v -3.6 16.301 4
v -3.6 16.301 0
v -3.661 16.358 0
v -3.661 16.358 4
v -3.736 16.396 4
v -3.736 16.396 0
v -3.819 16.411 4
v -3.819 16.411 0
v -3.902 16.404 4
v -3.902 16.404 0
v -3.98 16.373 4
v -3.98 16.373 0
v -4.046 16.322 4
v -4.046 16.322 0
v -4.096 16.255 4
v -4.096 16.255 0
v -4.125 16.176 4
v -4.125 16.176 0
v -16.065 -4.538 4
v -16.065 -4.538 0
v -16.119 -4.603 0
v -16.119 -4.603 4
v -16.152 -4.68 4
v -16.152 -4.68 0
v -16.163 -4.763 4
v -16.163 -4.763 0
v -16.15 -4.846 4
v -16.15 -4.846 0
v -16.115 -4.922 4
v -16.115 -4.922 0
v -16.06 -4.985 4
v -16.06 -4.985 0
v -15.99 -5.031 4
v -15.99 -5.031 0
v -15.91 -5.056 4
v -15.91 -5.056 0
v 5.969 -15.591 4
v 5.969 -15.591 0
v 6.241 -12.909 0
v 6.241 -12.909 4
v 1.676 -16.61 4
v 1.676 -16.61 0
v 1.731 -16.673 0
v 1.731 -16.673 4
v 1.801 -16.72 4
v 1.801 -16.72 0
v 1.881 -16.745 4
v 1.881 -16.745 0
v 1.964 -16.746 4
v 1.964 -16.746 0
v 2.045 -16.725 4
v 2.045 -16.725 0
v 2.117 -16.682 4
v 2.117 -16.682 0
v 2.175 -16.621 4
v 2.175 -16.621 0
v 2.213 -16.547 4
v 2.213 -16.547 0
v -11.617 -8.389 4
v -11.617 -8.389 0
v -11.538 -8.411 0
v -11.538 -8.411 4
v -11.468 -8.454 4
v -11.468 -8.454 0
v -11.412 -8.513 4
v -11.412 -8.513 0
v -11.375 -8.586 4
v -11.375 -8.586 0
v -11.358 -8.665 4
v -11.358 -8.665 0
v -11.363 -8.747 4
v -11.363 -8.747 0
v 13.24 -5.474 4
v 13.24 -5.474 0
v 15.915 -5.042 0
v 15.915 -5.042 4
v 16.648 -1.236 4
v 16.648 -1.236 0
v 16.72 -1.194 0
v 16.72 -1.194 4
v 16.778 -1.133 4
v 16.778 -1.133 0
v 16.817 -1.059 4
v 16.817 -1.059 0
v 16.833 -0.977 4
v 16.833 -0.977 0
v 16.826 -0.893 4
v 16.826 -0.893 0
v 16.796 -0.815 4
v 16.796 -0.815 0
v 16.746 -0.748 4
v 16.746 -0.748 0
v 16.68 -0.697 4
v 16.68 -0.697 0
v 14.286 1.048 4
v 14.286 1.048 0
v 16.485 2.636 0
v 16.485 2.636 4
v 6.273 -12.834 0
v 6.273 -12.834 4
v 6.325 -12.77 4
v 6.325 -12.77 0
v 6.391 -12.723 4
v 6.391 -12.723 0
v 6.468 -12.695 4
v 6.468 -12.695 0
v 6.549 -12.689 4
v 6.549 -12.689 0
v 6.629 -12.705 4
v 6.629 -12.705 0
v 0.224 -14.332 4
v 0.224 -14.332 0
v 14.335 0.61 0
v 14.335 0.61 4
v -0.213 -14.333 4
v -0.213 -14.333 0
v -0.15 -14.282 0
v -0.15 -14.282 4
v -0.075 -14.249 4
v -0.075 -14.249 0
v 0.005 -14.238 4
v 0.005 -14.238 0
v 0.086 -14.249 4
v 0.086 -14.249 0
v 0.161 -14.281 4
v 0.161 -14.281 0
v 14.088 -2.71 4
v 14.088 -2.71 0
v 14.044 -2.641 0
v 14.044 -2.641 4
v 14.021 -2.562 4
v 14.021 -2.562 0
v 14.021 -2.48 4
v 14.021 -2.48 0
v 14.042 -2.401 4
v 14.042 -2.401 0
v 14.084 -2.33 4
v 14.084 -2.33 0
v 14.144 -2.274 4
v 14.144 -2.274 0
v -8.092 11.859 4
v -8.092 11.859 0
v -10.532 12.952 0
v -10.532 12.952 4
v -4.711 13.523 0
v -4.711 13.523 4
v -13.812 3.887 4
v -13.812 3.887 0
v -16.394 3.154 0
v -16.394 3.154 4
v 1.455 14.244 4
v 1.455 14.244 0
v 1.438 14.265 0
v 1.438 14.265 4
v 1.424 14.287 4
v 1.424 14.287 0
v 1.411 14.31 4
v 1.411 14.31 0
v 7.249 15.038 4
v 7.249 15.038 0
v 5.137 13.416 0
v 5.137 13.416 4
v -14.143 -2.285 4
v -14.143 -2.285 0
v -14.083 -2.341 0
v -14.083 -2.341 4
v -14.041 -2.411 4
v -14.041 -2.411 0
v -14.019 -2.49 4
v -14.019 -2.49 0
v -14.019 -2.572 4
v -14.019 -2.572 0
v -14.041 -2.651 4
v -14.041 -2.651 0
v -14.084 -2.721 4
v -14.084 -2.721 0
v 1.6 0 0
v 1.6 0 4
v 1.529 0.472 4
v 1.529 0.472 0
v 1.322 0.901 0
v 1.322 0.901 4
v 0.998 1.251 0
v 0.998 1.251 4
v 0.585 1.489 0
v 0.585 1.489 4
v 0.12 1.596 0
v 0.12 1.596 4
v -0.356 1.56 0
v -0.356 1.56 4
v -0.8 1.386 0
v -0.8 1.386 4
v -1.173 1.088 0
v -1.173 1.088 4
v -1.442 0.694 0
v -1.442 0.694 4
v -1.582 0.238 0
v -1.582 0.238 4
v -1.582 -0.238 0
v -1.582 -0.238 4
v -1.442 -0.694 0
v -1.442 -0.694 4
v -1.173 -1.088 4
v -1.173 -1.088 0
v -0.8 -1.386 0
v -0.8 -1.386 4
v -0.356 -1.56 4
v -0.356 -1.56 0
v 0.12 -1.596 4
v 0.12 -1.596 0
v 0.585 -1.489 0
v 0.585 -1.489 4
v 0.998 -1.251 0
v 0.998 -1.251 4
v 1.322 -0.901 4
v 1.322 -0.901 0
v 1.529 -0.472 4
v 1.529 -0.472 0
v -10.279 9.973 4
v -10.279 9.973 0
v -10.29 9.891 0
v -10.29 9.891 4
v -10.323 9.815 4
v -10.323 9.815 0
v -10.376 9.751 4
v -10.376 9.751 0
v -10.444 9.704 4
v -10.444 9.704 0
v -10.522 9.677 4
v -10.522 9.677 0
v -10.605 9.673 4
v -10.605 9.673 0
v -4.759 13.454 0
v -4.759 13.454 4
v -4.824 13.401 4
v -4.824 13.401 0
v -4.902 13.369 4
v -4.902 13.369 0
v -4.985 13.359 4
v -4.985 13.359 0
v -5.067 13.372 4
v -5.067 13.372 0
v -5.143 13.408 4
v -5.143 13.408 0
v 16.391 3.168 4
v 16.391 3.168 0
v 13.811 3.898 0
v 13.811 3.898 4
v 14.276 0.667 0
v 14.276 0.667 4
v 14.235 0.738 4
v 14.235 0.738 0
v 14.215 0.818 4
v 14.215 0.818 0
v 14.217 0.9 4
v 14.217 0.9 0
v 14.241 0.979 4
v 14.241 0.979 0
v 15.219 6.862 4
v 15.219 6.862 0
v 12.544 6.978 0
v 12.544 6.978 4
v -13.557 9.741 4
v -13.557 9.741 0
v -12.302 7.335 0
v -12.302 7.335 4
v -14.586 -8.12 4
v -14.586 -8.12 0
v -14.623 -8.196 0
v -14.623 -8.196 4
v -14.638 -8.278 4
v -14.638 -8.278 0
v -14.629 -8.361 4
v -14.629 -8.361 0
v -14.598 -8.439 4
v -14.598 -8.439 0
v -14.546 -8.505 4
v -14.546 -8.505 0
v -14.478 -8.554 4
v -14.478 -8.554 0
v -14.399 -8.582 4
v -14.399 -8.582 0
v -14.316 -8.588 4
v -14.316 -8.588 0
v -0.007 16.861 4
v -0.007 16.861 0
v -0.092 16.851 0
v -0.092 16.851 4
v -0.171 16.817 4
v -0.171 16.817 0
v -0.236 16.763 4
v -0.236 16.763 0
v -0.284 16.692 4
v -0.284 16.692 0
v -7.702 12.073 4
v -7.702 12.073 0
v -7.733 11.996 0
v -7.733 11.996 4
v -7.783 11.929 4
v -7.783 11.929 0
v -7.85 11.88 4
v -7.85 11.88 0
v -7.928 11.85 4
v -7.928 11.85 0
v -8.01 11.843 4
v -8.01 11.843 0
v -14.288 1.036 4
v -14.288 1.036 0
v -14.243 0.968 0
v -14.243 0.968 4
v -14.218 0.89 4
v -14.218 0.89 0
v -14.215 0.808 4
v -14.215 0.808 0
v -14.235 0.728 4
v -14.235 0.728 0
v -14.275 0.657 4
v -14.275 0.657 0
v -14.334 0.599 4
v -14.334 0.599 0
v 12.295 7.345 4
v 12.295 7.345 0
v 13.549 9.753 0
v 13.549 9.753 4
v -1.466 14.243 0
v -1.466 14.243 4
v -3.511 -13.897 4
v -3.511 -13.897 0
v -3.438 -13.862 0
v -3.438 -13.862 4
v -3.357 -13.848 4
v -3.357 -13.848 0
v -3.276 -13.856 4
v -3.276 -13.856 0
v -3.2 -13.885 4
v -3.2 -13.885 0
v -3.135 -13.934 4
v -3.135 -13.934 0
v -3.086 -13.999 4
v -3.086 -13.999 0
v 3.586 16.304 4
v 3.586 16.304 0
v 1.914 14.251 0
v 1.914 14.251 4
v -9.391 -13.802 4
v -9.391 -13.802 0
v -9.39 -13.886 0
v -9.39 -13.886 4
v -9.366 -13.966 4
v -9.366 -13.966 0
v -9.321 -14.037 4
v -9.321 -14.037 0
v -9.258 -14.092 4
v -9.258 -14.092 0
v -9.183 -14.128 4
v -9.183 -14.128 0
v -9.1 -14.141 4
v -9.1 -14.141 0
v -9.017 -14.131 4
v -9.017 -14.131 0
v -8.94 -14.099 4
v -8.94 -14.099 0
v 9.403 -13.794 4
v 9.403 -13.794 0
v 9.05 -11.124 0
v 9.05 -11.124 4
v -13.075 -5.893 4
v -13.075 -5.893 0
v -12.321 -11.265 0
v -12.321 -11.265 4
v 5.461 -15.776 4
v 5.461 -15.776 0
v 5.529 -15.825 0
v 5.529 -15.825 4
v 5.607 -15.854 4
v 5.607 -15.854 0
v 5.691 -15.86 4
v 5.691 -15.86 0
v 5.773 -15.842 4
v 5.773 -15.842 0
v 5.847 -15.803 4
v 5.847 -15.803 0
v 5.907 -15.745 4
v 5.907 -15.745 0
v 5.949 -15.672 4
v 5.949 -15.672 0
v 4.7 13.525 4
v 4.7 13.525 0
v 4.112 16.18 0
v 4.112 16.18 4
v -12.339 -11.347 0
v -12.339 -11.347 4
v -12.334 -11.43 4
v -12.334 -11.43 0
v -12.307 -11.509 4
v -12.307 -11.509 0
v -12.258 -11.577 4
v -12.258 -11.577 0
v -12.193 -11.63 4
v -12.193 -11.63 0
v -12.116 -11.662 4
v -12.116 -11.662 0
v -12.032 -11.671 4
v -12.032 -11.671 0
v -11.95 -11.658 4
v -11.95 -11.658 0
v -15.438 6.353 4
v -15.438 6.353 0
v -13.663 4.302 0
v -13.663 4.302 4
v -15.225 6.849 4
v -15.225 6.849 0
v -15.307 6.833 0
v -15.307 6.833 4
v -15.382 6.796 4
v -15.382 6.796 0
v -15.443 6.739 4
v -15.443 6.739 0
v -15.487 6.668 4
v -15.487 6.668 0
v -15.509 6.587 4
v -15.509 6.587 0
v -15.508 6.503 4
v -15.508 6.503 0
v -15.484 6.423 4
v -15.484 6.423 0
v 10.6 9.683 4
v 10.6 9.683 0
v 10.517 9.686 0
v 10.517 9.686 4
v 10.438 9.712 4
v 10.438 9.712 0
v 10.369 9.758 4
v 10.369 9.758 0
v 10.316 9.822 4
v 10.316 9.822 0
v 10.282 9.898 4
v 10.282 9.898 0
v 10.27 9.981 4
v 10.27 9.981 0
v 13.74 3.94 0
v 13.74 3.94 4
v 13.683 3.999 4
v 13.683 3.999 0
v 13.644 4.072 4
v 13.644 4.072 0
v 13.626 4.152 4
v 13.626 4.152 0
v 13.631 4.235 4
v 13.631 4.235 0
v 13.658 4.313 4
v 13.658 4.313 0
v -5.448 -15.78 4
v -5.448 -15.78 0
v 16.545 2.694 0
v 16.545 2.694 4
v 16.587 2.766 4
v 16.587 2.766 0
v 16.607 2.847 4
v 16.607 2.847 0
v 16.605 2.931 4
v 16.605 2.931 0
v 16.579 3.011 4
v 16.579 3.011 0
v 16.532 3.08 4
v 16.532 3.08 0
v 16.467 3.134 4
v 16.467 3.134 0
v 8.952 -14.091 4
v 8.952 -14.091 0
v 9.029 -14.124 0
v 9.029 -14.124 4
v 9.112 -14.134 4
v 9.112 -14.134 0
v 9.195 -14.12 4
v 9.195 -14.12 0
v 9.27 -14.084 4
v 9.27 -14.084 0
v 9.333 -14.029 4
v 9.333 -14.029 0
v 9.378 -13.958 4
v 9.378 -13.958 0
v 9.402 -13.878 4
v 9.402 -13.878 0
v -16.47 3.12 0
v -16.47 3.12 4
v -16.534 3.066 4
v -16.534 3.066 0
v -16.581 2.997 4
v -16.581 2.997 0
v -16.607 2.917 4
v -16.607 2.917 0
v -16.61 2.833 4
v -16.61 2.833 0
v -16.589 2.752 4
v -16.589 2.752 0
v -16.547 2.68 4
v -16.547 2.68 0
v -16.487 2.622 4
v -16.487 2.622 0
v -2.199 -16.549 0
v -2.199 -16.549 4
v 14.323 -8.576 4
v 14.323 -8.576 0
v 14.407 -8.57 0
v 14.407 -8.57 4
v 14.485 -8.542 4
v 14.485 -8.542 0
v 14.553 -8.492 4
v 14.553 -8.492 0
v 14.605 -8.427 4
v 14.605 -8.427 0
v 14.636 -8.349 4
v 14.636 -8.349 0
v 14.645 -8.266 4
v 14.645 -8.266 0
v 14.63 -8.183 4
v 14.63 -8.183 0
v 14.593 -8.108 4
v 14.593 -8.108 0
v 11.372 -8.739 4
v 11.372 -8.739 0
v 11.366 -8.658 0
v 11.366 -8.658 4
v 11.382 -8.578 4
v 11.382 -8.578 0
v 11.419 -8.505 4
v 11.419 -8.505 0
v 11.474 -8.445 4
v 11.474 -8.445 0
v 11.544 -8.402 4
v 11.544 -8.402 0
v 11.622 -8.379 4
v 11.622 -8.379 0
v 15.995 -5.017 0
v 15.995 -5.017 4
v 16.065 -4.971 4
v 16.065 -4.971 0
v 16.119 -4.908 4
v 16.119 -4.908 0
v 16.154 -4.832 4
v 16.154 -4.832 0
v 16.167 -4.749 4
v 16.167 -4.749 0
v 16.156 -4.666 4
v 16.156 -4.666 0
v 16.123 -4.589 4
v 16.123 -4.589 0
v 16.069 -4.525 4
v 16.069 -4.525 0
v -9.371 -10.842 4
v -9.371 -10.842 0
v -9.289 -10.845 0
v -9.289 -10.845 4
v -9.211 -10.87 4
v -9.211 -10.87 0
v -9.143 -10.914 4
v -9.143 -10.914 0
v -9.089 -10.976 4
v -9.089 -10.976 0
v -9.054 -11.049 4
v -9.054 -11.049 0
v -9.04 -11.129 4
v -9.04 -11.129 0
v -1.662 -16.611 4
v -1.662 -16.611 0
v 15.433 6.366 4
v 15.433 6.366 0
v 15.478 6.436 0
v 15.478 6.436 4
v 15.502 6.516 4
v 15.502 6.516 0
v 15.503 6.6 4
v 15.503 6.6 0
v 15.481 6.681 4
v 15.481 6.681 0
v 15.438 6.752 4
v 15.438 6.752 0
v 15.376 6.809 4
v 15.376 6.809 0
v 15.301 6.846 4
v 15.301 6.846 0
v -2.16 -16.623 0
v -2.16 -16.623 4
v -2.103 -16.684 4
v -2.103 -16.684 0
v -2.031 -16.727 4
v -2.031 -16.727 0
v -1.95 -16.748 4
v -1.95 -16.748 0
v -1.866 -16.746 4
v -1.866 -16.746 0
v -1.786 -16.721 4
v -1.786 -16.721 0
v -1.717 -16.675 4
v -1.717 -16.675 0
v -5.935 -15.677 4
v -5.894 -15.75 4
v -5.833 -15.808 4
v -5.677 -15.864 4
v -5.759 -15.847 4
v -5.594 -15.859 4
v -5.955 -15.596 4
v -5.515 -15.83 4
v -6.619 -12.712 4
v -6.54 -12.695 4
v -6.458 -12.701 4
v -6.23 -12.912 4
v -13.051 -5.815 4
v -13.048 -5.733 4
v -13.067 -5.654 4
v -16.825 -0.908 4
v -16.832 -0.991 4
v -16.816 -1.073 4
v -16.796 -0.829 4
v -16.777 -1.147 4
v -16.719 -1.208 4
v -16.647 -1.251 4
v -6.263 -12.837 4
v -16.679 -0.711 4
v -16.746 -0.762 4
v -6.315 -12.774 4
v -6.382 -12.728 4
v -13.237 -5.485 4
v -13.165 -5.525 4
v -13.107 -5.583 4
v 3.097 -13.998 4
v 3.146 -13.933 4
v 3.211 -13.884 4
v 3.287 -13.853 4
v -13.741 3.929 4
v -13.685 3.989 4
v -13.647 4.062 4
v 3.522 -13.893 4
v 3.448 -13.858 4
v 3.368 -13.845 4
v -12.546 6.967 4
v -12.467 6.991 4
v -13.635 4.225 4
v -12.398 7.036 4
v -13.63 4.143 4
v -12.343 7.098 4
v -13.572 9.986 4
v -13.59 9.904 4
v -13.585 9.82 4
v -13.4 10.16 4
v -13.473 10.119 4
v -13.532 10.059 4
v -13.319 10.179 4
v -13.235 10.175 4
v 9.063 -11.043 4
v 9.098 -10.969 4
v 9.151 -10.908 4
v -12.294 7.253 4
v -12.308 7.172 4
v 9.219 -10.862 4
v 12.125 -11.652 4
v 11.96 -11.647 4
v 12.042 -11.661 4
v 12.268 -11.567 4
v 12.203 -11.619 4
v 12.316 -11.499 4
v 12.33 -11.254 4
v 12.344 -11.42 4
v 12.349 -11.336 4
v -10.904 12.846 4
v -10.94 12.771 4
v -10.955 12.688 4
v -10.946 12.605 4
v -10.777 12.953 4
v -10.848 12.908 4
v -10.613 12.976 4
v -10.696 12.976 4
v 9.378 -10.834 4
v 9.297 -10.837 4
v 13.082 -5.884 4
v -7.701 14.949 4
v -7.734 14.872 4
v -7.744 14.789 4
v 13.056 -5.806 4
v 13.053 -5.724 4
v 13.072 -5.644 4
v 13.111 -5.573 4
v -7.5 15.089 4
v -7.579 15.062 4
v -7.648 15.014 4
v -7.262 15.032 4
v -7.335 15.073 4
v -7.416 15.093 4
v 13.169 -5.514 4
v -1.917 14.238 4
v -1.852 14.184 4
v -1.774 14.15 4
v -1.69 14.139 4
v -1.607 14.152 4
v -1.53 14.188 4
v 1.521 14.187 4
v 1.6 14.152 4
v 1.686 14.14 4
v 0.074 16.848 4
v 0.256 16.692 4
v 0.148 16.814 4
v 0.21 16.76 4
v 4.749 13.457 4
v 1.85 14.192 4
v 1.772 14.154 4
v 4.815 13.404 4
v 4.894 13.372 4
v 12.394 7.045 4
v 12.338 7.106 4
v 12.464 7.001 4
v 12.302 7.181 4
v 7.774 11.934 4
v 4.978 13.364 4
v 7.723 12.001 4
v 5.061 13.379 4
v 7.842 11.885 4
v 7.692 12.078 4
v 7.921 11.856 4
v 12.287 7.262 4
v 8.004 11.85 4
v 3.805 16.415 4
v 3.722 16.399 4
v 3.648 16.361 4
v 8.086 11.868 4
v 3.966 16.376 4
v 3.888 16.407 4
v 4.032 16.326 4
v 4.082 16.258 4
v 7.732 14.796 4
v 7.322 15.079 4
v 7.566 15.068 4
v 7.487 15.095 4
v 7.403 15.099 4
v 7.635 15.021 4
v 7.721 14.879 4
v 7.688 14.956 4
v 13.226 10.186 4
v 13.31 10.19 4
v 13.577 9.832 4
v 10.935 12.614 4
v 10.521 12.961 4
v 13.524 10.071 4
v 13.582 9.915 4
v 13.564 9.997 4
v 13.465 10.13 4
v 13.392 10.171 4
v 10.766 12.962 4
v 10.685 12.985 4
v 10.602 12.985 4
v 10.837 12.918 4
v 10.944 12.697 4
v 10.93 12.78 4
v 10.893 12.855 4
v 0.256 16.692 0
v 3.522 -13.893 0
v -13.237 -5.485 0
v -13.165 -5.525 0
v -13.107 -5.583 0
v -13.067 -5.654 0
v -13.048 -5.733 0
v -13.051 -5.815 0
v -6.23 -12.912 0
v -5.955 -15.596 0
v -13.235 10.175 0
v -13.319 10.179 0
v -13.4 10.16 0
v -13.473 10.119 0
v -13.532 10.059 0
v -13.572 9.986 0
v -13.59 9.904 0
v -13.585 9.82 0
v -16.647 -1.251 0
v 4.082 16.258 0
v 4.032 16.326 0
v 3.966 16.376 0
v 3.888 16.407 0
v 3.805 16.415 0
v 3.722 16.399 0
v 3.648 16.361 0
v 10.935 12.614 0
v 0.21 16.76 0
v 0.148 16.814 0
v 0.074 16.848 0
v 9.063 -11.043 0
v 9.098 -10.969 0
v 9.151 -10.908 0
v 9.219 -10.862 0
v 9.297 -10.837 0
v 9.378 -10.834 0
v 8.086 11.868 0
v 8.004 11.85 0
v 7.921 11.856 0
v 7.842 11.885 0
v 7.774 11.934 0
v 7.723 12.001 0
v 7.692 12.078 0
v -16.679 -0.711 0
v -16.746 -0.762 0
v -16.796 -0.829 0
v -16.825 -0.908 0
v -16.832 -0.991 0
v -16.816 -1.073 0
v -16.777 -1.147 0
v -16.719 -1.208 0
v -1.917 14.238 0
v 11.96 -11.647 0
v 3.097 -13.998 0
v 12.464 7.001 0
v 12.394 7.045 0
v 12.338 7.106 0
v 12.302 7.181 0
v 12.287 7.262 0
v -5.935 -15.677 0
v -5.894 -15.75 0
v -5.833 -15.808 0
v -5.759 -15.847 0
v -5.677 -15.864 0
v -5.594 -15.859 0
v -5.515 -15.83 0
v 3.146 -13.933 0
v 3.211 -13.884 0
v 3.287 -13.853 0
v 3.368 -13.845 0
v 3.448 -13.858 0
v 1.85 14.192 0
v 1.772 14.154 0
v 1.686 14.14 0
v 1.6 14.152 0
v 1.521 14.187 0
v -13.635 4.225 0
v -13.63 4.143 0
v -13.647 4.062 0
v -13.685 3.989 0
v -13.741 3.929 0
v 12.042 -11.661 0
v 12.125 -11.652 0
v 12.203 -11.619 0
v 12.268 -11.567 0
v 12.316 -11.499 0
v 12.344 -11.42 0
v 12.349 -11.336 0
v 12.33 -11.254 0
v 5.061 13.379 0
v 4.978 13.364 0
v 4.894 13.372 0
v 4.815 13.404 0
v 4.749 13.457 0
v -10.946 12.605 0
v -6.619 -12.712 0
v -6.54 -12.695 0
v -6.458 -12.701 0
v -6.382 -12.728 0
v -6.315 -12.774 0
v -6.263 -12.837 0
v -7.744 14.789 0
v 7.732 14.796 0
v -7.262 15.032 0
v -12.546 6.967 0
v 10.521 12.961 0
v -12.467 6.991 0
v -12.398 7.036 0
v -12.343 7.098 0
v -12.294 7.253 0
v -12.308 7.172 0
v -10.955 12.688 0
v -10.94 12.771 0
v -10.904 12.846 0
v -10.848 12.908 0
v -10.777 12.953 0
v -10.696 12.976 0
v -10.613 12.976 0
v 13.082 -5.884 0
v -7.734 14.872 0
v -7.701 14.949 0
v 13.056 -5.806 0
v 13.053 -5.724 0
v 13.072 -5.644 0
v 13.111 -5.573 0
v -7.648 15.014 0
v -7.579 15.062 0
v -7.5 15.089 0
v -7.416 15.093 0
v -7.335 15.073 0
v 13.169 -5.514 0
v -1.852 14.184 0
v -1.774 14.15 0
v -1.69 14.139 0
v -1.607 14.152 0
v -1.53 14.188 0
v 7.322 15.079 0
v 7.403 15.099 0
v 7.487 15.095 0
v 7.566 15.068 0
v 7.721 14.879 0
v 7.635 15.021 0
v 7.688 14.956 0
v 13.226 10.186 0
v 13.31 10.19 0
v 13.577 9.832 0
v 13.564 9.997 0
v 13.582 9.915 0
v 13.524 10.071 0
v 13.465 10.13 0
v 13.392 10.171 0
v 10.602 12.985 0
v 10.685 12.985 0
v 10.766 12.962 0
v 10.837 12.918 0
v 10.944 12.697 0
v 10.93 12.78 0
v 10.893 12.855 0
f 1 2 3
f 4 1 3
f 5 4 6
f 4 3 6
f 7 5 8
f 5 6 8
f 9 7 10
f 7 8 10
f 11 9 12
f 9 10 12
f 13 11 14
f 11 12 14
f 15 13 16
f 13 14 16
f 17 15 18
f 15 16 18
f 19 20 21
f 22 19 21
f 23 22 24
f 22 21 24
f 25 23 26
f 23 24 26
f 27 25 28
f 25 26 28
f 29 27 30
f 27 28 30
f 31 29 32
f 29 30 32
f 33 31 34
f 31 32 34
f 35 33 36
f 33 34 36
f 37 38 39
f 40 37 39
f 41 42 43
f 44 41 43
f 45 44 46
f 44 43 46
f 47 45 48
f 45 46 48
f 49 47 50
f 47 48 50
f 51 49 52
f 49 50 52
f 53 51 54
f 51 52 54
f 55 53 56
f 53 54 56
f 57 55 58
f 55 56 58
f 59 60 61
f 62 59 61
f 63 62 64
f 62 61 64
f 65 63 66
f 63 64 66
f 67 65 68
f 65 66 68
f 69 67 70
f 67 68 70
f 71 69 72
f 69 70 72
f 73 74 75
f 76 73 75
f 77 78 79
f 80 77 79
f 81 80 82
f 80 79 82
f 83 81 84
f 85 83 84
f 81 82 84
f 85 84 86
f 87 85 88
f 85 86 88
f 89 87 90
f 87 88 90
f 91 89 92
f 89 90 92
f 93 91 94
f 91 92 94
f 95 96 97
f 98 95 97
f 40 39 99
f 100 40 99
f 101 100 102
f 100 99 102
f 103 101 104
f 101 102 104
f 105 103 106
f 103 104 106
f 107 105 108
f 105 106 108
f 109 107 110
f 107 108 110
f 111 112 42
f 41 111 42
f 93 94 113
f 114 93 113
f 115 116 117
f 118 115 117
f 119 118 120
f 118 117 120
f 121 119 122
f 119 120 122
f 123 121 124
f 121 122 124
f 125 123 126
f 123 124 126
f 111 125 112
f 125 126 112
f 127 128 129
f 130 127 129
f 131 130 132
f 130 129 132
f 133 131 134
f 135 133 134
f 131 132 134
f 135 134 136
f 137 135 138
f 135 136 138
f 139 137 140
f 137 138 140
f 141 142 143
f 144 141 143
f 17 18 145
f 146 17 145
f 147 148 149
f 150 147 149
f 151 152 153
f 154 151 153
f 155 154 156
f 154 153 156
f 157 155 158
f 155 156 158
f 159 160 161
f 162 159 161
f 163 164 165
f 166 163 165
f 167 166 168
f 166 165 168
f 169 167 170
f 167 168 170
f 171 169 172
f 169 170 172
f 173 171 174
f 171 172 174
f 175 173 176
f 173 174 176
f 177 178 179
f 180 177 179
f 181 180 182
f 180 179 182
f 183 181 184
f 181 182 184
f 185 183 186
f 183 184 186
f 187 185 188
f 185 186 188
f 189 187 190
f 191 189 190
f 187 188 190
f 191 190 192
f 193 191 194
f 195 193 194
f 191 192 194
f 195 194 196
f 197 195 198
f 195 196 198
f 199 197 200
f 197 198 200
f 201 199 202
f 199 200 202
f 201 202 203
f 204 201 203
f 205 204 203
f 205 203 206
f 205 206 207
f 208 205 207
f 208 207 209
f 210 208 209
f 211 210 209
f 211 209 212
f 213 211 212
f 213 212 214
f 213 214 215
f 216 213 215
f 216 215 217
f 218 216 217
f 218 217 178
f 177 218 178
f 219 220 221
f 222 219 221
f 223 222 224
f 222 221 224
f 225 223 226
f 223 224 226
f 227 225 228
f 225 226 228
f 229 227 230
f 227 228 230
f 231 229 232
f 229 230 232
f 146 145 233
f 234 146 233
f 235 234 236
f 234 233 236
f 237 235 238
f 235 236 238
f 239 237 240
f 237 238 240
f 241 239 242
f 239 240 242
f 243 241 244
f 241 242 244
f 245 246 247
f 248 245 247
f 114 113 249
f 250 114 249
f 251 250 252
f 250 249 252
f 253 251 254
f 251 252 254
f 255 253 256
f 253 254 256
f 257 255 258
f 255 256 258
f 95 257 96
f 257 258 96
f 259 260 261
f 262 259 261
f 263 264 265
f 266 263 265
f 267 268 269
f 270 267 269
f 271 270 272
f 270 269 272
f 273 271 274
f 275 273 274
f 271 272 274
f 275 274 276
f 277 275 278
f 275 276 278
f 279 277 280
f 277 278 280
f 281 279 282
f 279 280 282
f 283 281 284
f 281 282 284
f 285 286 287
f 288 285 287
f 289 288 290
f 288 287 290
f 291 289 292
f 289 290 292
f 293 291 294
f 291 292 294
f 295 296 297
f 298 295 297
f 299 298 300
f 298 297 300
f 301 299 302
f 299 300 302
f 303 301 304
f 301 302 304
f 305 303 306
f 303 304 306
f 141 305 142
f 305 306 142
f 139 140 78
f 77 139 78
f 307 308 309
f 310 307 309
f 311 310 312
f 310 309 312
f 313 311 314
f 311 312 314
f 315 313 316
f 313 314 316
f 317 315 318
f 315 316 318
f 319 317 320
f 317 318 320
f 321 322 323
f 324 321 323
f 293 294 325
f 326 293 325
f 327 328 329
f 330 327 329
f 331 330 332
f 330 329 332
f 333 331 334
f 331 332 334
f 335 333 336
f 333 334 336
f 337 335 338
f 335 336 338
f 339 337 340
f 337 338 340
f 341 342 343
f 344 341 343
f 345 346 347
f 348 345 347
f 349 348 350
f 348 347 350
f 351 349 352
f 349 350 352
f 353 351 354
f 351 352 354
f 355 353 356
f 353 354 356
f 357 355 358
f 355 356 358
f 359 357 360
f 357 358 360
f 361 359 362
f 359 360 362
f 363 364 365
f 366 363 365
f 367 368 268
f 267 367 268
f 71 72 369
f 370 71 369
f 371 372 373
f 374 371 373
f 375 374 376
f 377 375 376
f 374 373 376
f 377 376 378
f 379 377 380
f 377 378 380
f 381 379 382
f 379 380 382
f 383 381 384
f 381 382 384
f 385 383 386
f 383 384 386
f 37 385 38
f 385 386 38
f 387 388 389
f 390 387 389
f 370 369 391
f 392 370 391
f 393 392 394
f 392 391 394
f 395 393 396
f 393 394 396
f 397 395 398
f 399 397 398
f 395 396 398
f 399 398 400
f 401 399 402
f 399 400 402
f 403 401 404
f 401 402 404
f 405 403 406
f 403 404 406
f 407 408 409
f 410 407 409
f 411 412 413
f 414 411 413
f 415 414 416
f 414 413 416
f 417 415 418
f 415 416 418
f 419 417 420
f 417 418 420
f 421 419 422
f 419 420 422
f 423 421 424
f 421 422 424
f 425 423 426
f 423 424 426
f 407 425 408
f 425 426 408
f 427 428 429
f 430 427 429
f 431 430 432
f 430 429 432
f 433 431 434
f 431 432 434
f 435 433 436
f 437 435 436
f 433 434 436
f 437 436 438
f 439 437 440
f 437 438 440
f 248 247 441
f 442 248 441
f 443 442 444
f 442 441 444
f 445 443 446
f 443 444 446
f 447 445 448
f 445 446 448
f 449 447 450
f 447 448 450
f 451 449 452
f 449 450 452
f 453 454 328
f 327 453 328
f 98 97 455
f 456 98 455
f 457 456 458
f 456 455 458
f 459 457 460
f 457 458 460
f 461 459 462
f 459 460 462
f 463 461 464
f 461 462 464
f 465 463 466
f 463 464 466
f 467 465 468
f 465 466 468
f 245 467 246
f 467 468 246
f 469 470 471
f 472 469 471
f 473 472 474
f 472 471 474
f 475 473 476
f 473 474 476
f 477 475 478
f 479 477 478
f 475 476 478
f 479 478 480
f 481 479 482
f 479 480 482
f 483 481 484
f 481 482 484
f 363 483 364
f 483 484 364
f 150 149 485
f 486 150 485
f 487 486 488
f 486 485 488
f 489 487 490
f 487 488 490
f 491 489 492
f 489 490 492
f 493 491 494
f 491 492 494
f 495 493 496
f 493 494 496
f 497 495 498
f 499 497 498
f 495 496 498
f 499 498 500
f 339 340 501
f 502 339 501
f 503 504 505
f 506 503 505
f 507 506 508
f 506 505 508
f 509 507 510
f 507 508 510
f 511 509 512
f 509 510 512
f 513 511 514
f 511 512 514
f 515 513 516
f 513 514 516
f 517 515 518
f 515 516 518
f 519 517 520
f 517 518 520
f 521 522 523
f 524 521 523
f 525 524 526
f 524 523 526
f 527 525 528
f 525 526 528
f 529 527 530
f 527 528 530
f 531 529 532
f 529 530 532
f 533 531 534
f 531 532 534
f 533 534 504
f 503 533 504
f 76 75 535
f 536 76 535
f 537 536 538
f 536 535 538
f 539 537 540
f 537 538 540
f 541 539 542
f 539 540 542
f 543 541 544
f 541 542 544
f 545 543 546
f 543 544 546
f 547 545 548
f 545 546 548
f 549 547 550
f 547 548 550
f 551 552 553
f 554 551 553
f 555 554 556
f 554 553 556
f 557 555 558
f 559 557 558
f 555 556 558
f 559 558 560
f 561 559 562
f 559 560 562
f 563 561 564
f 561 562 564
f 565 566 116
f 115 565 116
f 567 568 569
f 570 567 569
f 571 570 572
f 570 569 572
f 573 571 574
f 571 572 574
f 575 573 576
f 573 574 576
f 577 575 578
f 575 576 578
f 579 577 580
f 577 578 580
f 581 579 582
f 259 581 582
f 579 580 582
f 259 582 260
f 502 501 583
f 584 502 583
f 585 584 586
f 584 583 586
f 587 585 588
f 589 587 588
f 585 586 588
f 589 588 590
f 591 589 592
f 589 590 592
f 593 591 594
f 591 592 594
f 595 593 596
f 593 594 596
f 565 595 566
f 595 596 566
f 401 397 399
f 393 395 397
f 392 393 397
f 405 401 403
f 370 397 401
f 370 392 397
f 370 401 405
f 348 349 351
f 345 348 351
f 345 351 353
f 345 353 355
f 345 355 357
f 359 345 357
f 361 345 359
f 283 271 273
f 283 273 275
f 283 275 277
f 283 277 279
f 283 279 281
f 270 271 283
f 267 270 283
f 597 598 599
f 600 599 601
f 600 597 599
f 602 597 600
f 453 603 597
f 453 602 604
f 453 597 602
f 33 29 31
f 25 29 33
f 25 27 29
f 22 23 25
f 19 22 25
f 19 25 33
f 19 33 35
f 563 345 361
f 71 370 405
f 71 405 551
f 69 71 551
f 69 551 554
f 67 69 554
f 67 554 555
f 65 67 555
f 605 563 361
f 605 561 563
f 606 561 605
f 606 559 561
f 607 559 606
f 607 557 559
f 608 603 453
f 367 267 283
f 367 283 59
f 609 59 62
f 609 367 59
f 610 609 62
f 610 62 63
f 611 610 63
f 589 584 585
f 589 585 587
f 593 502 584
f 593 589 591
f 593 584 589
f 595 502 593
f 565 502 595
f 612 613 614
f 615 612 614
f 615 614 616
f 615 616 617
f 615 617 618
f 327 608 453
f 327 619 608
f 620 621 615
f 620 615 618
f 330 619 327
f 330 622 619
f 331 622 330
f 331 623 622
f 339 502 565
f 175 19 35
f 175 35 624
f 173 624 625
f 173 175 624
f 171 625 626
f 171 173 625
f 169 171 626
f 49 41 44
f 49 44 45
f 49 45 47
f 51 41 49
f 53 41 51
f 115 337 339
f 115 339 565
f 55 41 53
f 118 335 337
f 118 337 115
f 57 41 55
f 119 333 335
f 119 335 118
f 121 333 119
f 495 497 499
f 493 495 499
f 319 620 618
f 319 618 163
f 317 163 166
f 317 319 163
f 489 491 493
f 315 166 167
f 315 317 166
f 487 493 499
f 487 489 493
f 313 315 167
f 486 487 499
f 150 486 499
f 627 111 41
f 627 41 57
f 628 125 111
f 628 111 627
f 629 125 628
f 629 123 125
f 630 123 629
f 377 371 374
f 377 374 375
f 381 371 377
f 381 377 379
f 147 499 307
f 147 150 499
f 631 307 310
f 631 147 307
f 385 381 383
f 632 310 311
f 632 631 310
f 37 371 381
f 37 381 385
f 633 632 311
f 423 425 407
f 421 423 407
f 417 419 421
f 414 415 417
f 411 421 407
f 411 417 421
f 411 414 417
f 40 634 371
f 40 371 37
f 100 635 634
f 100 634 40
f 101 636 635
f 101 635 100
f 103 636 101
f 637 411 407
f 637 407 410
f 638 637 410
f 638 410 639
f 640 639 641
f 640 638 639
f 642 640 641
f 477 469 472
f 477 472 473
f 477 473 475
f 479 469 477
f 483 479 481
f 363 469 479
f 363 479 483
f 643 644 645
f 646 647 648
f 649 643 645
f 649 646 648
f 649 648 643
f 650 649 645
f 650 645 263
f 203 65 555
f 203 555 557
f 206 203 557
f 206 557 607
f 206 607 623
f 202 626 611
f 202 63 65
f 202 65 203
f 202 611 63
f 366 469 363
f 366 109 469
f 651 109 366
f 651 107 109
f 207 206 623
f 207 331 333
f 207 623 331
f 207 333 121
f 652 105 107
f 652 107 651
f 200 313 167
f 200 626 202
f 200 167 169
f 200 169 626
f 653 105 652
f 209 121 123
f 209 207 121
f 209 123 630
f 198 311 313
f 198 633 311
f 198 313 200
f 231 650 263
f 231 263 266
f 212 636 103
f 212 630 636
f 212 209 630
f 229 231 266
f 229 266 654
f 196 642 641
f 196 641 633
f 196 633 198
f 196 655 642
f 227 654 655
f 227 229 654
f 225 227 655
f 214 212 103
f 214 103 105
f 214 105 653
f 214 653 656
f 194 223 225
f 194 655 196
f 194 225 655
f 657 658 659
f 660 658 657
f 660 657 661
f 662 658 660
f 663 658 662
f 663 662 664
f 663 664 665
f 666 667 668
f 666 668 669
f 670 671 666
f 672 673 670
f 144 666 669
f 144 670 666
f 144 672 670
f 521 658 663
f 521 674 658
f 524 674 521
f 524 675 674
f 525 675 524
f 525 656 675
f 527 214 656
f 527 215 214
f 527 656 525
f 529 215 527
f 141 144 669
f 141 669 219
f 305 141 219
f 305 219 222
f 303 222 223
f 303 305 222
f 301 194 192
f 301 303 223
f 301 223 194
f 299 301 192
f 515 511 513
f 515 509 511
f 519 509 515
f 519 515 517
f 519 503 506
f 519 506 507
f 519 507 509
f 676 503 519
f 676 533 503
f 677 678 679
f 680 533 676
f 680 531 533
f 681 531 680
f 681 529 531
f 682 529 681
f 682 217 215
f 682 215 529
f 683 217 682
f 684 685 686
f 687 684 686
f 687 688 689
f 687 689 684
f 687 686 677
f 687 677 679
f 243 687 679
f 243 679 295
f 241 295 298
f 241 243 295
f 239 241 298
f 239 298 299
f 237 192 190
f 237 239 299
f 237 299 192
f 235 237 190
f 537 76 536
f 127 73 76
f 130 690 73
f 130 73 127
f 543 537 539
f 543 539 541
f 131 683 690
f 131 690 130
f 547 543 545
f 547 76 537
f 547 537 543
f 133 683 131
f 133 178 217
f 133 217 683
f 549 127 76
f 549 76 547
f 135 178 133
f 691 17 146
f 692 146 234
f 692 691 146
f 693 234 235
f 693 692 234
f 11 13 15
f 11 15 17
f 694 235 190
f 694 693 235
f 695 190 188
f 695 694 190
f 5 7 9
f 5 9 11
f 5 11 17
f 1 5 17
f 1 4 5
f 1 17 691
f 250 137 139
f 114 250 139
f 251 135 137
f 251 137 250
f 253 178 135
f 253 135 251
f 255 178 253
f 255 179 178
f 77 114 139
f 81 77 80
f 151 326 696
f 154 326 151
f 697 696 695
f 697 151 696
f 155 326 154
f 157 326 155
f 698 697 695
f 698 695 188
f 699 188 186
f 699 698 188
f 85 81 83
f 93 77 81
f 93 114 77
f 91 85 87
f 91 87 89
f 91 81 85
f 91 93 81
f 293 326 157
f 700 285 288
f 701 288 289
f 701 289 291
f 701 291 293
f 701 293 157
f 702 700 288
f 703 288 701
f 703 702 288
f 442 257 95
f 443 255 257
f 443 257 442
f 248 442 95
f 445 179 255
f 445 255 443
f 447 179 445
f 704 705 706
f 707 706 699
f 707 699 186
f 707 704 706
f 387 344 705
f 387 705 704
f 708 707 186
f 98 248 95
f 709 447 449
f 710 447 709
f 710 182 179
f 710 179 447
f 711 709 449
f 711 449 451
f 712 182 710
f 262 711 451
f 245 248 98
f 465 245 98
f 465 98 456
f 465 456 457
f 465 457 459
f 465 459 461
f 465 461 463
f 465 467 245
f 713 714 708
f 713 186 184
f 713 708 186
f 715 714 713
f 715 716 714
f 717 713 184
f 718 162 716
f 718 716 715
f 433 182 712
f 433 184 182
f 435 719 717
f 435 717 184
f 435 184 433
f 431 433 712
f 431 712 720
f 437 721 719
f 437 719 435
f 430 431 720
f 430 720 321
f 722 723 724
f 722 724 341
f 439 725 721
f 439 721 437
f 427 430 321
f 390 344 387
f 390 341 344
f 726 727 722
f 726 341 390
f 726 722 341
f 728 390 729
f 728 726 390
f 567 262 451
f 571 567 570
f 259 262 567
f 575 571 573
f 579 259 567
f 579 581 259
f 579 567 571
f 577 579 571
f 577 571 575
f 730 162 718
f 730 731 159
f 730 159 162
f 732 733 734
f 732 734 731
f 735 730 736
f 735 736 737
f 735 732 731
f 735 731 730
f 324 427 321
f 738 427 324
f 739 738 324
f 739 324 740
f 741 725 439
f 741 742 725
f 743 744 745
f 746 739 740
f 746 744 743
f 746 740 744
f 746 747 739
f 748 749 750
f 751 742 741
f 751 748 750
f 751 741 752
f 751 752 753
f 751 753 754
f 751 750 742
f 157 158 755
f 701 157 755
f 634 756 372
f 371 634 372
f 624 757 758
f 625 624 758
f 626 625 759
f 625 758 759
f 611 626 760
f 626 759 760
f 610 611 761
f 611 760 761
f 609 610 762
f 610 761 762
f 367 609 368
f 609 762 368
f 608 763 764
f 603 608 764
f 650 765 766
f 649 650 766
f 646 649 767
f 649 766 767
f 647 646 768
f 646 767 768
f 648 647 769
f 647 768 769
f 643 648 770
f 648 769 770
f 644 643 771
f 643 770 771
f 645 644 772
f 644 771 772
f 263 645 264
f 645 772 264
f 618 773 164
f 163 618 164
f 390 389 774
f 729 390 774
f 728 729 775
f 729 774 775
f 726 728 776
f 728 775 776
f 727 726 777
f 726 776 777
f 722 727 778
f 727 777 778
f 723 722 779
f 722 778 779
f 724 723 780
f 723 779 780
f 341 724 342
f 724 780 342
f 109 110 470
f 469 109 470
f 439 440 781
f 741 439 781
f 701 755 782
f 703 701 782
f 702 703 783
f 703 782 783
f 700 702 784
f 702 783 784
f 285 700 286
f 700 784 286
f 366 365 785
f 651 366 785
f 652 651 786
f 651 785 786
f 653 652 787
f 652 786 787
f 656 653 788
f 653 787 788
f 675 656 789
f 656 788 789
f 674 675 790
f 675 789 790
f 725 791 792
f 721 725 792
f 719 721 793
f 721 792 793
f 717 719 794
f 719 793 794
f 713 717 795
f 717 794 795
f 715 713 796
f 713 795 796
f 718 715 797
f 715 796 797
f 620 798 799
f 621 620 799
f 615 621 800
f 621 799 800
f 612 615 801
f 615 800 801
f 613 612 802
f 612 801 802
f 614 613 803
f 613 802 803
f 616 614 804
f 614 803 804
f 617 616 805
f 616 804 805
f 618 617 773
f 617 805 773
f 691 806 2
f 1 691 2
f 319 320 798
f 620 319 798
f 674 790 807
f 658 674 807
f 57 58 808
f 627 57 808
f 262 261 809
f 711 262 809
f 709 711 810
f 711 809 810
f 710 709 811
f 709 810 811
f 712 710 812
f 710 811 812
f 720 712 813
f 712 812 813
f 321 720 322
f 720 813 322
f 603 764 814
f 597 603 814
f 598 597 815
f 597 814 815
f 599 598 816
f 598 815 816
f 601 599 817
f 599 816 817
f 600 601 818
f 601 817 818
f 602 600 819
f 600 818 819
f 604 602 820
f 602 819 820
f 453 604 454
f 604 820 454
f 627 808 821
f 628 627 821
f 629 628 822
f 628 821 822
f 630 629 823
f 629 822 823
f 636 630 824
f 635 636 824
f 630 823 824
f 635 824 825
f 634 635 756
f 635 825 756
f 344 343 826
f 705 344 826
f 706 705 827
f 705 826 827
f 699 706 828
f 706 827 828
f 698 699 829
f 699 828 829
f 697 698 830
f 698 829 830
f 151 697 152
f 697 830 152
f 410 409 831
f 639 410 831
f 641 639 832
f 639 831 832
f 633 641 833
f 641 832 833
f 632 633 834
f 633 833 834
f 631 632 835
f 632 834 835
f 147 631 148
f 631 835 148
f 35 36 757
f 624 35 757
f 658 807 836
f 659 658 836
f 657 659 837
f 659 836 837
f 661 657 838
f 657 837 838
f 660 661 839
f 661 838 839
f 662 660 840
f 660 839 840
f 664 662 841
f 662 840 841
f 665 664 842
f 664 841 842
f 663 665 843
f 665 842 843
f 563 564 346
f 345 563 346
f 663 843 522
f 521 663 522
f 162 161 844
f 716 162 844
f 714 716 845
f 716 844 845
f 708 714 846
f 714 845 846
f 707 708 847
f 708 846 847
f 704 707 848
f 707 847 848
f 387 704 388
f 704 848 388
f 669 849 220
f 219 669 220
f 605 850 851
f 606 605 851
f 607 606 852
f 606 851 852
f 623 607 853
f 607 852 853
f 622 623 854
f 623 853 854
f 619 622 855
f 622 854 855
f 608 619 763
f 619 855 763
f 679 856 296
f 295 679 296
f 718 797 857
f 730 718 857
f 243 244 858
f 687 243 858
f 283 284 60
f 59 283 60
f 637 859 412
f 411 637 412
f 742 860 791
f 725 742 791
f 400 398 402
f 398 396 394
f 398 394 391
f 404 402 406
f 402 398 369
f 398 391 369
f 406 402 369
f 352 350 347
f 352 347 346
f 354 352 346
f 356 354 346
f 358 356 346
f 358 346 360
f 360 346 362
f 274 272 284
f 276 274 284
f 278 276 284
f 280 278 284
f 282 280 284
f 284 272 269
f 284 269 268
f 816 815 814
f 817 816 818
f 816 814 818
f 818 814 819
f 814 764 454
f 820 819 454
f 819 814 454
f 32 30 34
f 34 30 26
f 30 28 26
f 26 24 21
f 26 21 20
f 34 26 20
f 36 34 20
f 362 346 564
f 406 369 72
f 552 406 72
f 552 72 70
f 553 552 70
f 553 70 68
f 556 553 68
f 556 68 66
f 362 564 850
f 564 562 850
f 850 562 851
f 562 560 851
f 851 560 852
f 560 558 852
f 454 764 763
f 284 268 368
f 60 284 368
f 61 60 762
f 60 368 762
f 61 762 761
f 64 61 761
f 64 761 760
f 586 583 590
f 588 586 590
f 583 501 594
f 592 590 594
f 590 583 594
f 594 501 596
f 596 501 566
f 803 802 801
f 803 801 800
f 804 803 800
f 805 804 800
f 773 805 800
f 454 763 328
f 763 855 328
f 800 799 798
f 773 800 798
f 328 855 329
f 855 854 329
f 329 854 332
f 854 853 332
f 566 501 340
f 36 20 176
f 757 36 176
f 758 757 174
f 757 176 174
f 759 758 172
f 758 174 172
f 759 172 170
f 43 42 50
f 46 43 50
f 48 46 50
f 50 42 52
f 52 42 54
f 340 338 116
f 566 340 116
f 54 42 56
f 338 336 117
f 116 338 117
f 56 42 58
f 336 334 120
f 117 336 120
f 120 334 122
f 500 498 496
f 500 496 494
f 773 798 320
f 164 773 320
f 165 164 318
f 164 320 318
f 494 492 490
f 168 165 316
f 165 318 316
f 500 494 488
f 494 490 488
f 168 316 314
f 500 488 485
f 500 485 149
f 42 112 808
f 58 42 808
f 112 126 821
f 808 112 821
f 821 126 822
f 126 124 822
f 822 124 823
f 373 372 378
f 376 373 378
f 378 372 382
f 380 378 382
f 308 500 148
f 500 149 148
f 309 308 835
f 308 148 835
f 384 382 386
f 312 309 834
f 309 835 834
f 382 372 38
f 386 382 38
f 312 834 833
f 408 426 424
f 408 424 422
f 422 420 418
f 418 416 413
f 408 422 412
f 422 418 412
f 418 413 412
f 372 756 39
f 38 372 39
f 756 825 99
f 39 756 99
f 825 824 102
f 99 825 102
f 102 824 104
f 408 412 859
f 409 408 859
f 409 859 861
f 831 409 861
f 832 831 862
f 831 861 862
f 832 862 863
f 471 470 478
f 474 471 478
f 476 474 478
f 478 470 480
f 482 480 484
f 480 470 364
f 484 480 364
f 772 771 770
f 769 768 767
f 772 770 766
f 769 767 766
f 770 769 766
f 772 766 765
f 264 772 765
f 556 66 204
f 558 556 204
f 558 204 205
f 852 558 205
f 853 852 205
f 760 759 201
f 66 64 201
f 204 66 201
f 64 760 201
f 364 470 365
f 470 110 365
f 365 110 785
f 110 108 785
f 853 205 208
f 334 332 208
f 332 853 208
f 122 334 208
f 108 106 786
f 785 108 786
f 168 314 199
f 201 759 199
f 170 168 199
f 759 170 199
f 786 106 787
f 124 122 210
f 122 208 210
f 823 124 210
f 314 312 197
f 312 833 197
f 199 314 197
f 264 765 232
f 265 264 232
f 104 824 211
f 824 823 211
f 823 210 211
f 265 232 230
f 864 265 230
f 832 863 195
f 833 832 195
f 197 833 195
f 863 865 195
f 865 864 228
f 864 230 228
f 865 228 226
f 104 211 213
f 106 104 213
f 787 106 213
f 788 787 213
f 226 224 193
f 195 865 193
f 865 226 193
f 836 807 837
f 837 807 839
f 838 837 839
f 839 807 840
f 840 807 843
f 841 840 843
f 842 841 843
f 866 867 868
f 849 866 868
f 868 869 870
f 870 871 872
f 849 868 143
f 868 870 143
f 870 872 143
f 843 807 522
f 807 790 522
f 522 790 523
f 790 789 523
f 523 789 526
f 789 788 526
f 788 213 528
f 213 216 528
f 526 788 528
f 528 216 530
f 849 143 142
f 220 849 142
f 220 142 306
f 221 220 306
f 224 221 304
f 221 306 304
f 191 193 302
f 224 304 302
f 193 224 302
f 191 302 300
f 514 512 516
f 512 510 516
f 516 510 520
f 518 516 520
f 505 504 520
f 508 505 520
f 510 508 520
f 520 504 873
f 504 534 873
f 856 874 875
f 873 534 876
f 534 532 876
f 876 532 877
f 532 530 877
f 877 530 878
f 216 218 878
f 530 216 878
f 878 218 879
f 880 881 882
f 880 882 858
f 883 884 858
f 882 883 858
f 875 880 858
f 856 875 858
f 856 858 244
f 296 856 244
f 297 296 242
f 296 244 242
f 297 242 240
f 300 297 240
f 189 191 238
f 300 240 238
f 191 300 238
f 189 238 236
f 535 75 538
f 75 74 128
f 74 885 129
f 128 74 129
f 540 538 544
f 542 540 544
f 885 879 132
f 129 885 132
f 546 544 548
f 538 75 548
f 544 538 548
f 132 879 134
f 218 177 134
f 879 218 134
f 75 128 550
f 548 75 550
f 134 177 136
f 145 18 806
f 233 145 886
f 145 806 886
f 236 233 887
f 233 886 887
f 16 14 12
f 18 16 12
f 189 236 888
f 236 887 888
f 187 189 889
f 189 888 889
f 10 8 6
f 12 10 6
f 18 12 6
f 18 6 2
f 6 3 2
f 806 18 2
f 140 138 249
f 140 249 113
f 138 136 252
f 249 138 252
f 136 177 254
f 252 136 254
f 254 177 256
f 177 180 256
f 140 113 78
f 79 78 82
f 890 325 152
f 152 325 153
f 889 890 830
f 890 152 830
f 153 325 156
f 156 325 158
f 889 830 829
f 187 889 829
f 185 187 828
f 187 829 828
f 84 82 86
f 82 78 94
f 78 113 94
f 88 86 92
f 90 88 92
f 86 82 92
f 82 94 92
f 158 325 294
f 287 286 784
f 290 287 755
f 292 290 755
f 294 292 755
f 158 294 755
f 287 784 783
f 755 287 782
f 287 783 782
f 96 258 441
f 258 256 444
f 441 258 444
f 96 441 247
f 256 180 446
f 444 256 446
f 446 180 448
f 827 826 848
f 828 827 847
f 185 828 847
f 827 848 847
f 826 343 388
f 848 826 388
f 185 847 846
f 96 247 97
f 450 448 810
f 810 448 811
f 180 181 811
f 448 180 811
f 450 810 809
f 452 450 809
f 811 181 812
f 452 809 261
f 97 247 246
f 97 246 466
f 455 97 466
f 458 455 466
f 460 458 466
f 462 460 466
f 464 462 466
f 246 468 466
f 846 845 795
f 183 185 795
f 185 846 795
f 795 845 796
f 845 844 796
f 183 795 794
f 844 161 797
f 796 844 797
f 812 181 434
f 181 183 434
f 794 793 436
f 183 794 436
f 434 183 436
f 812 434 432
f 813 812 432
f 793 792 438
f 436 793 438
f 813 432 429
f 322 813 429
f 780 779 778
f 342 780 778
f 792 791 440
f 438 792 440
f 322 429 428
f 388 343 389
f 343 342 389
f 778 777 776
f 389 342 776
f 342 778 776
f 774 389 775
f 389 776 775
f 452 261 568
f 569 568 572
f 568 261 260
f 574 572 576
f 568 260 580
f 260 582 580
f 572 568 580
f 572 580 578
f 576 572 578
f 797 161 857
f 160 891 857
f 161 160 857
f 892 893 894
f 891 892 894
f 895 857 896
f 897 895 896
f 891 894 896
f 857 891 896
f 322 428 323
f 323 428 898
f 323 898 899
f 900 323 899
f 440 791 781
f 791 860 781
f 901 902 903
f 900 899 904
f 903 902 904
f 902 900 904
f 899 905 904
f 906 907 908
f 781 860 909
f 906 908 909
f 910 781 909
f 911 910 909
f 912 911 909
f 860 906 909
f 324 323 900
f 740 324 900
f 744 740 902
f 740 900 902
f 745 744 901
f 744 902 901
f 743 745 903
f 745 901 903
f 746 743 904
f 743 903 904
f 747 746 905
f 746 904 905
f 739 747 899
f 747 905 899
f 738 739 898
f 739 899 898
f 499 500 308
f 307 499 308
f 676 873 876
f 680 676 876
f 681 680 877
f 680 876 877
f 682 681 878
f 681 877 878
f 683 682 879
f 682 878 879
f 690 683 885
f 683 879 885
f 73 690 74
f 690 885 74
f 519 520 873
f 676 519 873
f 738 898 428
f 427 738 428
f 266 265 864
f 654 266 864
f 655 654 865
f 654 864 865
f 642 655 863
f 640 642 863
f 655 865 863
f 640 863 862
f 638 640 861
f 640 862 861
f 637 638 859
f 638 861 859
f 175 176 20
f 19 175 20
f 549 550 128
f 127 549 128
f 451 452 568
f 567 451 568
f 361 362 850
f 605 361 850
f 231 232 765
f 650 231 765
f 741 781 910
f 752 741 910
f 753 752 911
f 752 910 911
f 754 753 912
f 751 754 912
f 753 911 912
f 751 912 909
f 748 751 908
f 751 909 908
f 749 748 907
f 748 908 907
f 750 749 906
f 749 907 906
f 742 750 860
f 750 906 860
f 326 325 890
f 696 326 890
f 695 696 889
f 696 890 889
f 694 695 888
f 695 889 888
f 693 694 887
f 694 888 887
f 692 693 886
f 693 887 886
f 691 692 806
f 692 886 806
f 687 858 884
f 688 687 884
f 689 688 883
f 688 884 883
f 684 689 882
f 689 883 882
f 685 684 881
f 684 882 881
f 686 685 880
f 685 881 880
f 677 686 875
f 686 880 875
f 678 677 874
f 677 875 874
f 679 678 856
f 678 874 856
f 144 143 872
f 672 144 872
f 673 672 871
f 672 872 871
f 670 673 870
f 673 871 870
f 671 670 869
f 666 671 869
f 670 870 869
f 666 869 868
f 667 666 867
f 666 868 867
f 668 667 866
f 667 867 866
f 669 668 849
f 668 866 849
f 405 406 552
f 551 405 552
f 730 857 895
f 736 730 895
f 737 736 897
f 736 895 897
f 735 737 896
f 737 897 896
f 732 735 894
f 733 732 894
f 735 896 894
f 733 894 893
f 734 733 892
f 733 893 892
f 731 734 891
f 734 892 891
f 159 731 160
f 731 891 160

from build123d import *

# Parameters (mm, degrees)
F1_DEPTH = 4
F2_R     = 1.6
F3_DEPTH = 4.001


# Not quite as in the source:
# - ends of sketch curves that miss each other by under 0.0002 mm in the source are joined


with BuildPart() as f1:
    # F0 (on Top) → F1 (new body)
    with BuildSketch(Plane.XY):
        with BuildLine():
            ThreePointArc((1.9140106254, 14.2508572736), (1.6861265158, 14.1403198405), (1.4548574179, 14.2435879186))
            ThreePointArc((1.4548574179, 14.2435879186), (1.4306890387, 14.2754935862), (1.4109831428, 14.3103326425))
            Line((1.4109831428, 14.3103326425), (0.2558581901, 16.6921894723))
            ThreePointArc((0.2558581901, 16.6921894723), (0.1481039871, 16.8136670177), (-0.0071641706, 16.8612018631))
            ThreePointArc((-0.0071641706, 16.8612018631), (-0.1706127192, 16.817202235), (-0.2842271711, 16.6917305187))
            Line((-0.2842271711, 16.6917305187), (-1.4664410979, 14.2434227482))
            ThreePointArc((-1.4664410979, 14.2434227482), (-1.6902437576, 14.1388197245), (-1.916663057, 14.237631282))
            Line((-1.916663057, 14.237631282), (-3.6000092117, 16.3013673957))
            ThreePointArc((-3.6000092117, 16.3013673957), (-3.9019049125, 16.4036015506), (-4.125434594, 16.1763850942))
            Line((-4.125434594, 16.1763850942), (-4.7109828334, 13.5226488797))
            ThreePointArc((-4.7109828334, 13.5226488797), (-4.9015400565, 13.3688823231), (-5.1432019185, 13.4083253663))
            Line((-5.1432019185, 13.4083253663), (-7.2618513891, 15.0319710101))
            ThreePointArc((-7.2618513891, 15.0319710101), (-7.579185331, 15.0618374778), (-7.7442986009, 14.7892013747))
            Line((-7.7442986009, 14.7892013747), (-7.702174618, 12.0732144933))
            ThreePointArc((-7.702174618, 12.0732144933), (-7.8496947229, 11.8796668128), (-8.0921885063, 11.8591814286))
            Line((-8.0921885063, 11.8591814286), (-10.532310636, 12.9524153773))
            ThreePointArc((-10.532310636, 12.9524153773), (-10.8479798704, 12.9083044823), (-10.9457778263, 12.604942658))
            Line((-10.9457778263, 12.604942658), (-10.2788390418, 9.9731081586))
            ThreePointArc((-10.2788390418, 9.9731081586), (-10.375659889, 9.7510858631), (-10.6049250215, 9.6729470431))
            Line((-10.6049250215, 9.6729470431), (-13.2351231204, 10.1747796938))
            ThreePointArc((-13.2351231204, 10.1747796938), (-13.5321144192, 10.0590688256), (-13.5573261675, 9.7413311912))
            Line((-13.5573261675, 9.7413311912), (-12.3021100194, 7.3353788314))
            ThreePointArc((-12.3021100194, 7.3353788314), (-12.3432937572, 7.097610167), (-12.5462575743, 6.967089184))
            Line((-12.5462575743, 6.967089184), (-15.2246187544, 6.8487666996))
            ThreePointArc((-15.2246187544, 6.8487666996), (-15.4869255508, 6.6676921814), (-15.4381922857, 6.3527034427))
            Line((-15.4381922857, 6.3527034427), (-13.6629152877, 4.3020497532))
            ThreePointArc((-13.6629152877, 4.3020497532), (-13.6465657396, 4.062029571), (-13.8118007442, 3.8871742342))
            Line((-13.8118007442, 3.8871742342), (-16.3935721919, 3.153634337))
            ThreePointArc((-16.3935721919, 3.153634337), (-16.6070572662, 2.9169553146), (-16.4870055032, 2.621692024))
            Line((-16.4870055032, 2.621692024), (-14.2878546387, 1.0364711274))
            ThreePointArc((-14.2878546387, 1.0364711274), (-14.2152379851, 0.8077409694), (-14.3335516124, 0.5989526815))
            Line((-14.3335516124, 0.5989526815), (-16.6789818187, -0.7114654884))
            ThreePointArc((-16.6789818187, -0.7114654884), (-16.832139234, -0.9909930232), (-16.6472392521, -1.2506174313))
            Line((-16.6472392521, -1.2506174313), (-14.1431571391, -2.2854765977))
            ThreePointArc((-14.1431571391, -2.2854765977), (-14.0186393167, -2.4900607643), (-14.0835502146, -2.7205948066))
            Line((-14.0835502146, -2.7205948066), (-16.0654652706, -4.5382203487))
            ThreePointArc((-16.0654652706, -4.5382203487), (-16.1500404943, -4.8455310516), (-15.9102576154, -5.0555239268))
            Line((-15.9102576154, -5.0555239268), (-13.2365040498, -5.4848550701))
            ThreePointArc((-13.2365040498, -5.4848550701), (-13.0673141606, -5.6538228156), (-13.0753841374, -5.8928002059))
            Line((-13.0753841374, -5.8928002059), (-14.5860884781, -8.1203844463))
            ThreePointArc((-14.5860884781, -8.1203844463), (-14.5975232656, -8.4389155785), (-14.3157807663, -8.5879591986))
            Line((-14.3157807663, -8.5879591986), (-11.6166191171, -8.3893058066))
            ThreePointArc((-11.6166191171, -8.3893058066), (-11.4124537807, -8.5131996233), (-11.3634554587, -8.746935215))
            Line((-11.3634554587, -8.746935215), (-12.3205835531, -11.2648943843))
            ThreePointArc((-12.3205835531, -11.2648943843), (-12.258261618, -11.5774784738), (-11.9497442197, -11.6575400221))
            Line((-11.9497442197, -11.6575400221), (-9.3706481648, -10.8423342647))
            ThreePointArc((-9.3706481648, -10.8423342647), (-9.143139116, -10.914229028), (-9.0400495076, -11.1294074585))
            Line((-9.0400495076, -11.1294074585), (-9.3910515674, -13.8022744624))
            ThreePointArc((-9.3910515674, -13.8022744624), (-9.2583317968, -14.0920645572), (-8.9396672739, -14.0988290571))
            Line((-8.9396672739, -14.0988290571), (-6.6194690015, -12.711740107))
            ThreePointArc((-6.6194690015, -12.711740107), (-6.3815431901, -12.7276255469), (-6.2303634454, -12.912031956))
            Line((-6.2303634454, -12.912031956), (-5.955381825, -15.5957706951))
            ThreePointArc((-5.955381825, -15.5957706951), (-5.7594172495, -15.8471483428), (-5.4477802634, -15.7802512165))
            Line((-5.4477802634, -15.7802512165), (-3.5111841497, -13.8967395131))
            ThreePointArc((-3.5111841497, -13.8967395131), (-3.2763512695, -13.8557442651), (-3.0857625615, -13.9989330789))
            Line((-3.0857625615, -13.9989330789), (-2.1987423004, -16.54872127))
            ThreePointArc((-2.1987423004, -16.54872127), (-1.9500945765, -16.7481382853), (-1.6622810343, -16.6111850031))
            Line((-1.6622810343, -16.6111850031), (-0.2131467972, -14.3333958211))
            ThreePointArc((-0.2131467972, -14.3333958211), (0.005246929, -14.2378403367), (0.2243723928, -14.331705673))
            Line((0.2243723928, -14.331705673), (1.6764001268, -16.6097662074))
            ThreePointArc((1.6764001268, -16.6097662074), (1.9643299452, -16.746474862), (2.2128081189, -16.546846623))
            Line((2.2128081189, -16.546846623), (3.0970506062, -13.9980658779))
            ThreePointArc((3.0970506062, -13.9980658779), (3.286561705, -13.8533408388), (3.521767647, -13.8925576515))
            Line((3.521767647, -13.8925576515), (5.4611917751, -15.775615445))
            ThreePointArc((5.4611917751, -15.775615445), (5.7728854965, -15.8422477244), (5.9686363857, -15.5907036409))
            Line((5.9686363857, -15.5907036409), (6.2411397895, -12.9086763338))
            ThreePointArc((6.2411397895, -12.9086763338), (6.3909195318, -12.7229527682), (6.6288572495, -12.7052650163))
            Line((6.6288572495, -12.7052650163), (8.9516484854, -14.0912261582))
            ThreePointArc((8.9516484854, -14.0912261582), (9.2703071449, -14.0841908662), (9.4027806099, -13.7942880935))
            Line((9.4027806099, -13.7942880935), (9.0497770711, -11.1237609685))
            ThreePointArc((9.0497770711, -11.1237609685), (9.1511783498, -10.9075475026), (9.3783451778, -10.8338880535))
            Line((9.3783451778, -10.8338880535), (11.9596494988, -11.6473797597))
            ThreePointArc((11.9596494988, -11.6473797597), (12.268098751, -11.5670560686), (12.3301550361, -11.2544191321))
            Line((12.3301550361, -11.2544191321), (11.3716636637, -8.7393106928))
            ThreePointArc((11.3716636637, -8.7393106928), (11.4187295037, -8.5048818109), (11.6222137202, -8.3793180118))
            Line((11.6222137202, -8.3793180118), (14.3230763647, -8.5757891676))
            ThreePointArc((14.3230763647, -8.5757891676), (14.604692108, -8.4265061824), (14.5929866434, -8.1079848822))
            Line((14.5929866434, -8.1079848822), (13.0816946487, -5.8836056031))
            ThreePointArc((13.0816946487, -5.8836056031), (13.0715015116, -5.644332005), (13.2396929757, -5.4738404035))
            Line((13.2396929757, -5.4738404035), (15.9145504354, -5.0420000401))
            ThreePointArc((15.9145504354, -5.0420000401), (16.15415478, -4.8318034782), (16.0693184405, -4.5245647566))
            Line((16.0693184405, -4.5245647566), (14.0876977194, -2.7103070117))
            ThreePointArc((14.0876977194, -2.7103070117), (14.0205346934, -2.4799248131), (14.1437623045, -2.2740078751))
            Line((14.1437623045, -2.2740078751), (16.648298033, -1.2364685688))
            ThreePointArc((16.648298033, -1.2364685688), (16.8329773247, -0.9766871303), (16.6795824278, -0.6972898464))
            Line((16.6795824278, -0.6972898464), (14.335398798, 0.6098192161))
            ThreePointArc((14.335398798, 0.6098192161), (14.2147728105, 0.8179597828), (14.2858336525, 1.0477933771))
            Line((14.2858336525, 1.0477933771), (16.4847732853, 2.6357032988))
            ThreePointArc((16.4847732853, 2.6357032988), (16.6045740963, 2.9310685003), (16.3908879741, 3.1675660221))
            Line((16.3908879741, 3.1675660221), (13.8113473036, 3.8981036809))
            ThreePointArc((13.8113473036, 3.8981036809), (13.6438142546, 4.0717671277), (13.6583646175, 4.3126293336))
            Line((13.6583646175, 4.3126293336), (15.4327894801, 6.3658219818))
            ThreePointArc((15.4327894801, 6.3658219818), (15.4812550566, 6.6808520192), (15.2187944815, 6.8617035691))
            Line((15.2187944815, 6.8617035691), (12.5436443132, 6.9776065604))
            ThreePointArc((12.5436443132, 6.9776065604), (12.3384761371, 7.1063341886), (12.2952606451, 7.3446558284))
            Line((12.2952606451, 7.3446558284), (13.5490440665, 9.7528499611))
            ThreePointArc((13.5490440665, 9.7528499611), (13.5235623203, 10.0705660564), (13.2264728, 10.1860245057))
            Line((13.2264728, 10.1860245057), (10.6004372903, 9.6826728997))
            ThreePointArc((10.6004372903, 9.6826728997), (10.3691452759, 9.7583299946), (10.2700448298, 9.9805890632))
            Line((10.2700448298, 9.9805890632), (10.9350629039, 12.6142408462))
            ThreePointArc((10.9350629039, 12.6142408462), (10.8370071926, 12.9175194542), (10.5213005877, 12.961362084))
            Line((10.5213005877, 12.961362084), (8.0862749191, 11.8679259428))
            ThreePointArc((8.0862749191, 11.8679259428), (7.8420206158, 11.8850667554), (7.6918940409, 12.0784988717))
            Line((7.6918940409, 12.0784988717), (7.7317284499, 14.7957778483))
            ThreePointArc((7.7317284499, 14.7957778483), (7.566383559, 15.0682735431), (7.2490751116, 15.0381374223))
            Line((7.2490751116, 15.0381374223), (5.1365969535, 13.4163699229))
            ThreePointArc((5.1365969535, 13.4163699229), (4.8935343549, 13.3722272394), (4.6997550083, 13.5254511546))
            Line((4.6997550083, 13.5254511546), (4.1116867961, 16.1798854092))
            ThreePointArc((4.1116867961, 16.1798854092), (3.8879641114, 16.4069118327), (3.5861553961, 16.3044211699))
            Line((3.5861553961, 16.3044211699), (1.9140106254, 14.2508572736))
        make_face()
    extrude(amount=F1_DEPTH)

    # F2 (on face) → F3 (cut, through all)
    with BuildSketch(Plane.XY.offset(4)):
        Circle(F2_R)
    extrude(amount=-F3_DEPTH, mode=Mode.SUBTRACT)


solid = f1.part
